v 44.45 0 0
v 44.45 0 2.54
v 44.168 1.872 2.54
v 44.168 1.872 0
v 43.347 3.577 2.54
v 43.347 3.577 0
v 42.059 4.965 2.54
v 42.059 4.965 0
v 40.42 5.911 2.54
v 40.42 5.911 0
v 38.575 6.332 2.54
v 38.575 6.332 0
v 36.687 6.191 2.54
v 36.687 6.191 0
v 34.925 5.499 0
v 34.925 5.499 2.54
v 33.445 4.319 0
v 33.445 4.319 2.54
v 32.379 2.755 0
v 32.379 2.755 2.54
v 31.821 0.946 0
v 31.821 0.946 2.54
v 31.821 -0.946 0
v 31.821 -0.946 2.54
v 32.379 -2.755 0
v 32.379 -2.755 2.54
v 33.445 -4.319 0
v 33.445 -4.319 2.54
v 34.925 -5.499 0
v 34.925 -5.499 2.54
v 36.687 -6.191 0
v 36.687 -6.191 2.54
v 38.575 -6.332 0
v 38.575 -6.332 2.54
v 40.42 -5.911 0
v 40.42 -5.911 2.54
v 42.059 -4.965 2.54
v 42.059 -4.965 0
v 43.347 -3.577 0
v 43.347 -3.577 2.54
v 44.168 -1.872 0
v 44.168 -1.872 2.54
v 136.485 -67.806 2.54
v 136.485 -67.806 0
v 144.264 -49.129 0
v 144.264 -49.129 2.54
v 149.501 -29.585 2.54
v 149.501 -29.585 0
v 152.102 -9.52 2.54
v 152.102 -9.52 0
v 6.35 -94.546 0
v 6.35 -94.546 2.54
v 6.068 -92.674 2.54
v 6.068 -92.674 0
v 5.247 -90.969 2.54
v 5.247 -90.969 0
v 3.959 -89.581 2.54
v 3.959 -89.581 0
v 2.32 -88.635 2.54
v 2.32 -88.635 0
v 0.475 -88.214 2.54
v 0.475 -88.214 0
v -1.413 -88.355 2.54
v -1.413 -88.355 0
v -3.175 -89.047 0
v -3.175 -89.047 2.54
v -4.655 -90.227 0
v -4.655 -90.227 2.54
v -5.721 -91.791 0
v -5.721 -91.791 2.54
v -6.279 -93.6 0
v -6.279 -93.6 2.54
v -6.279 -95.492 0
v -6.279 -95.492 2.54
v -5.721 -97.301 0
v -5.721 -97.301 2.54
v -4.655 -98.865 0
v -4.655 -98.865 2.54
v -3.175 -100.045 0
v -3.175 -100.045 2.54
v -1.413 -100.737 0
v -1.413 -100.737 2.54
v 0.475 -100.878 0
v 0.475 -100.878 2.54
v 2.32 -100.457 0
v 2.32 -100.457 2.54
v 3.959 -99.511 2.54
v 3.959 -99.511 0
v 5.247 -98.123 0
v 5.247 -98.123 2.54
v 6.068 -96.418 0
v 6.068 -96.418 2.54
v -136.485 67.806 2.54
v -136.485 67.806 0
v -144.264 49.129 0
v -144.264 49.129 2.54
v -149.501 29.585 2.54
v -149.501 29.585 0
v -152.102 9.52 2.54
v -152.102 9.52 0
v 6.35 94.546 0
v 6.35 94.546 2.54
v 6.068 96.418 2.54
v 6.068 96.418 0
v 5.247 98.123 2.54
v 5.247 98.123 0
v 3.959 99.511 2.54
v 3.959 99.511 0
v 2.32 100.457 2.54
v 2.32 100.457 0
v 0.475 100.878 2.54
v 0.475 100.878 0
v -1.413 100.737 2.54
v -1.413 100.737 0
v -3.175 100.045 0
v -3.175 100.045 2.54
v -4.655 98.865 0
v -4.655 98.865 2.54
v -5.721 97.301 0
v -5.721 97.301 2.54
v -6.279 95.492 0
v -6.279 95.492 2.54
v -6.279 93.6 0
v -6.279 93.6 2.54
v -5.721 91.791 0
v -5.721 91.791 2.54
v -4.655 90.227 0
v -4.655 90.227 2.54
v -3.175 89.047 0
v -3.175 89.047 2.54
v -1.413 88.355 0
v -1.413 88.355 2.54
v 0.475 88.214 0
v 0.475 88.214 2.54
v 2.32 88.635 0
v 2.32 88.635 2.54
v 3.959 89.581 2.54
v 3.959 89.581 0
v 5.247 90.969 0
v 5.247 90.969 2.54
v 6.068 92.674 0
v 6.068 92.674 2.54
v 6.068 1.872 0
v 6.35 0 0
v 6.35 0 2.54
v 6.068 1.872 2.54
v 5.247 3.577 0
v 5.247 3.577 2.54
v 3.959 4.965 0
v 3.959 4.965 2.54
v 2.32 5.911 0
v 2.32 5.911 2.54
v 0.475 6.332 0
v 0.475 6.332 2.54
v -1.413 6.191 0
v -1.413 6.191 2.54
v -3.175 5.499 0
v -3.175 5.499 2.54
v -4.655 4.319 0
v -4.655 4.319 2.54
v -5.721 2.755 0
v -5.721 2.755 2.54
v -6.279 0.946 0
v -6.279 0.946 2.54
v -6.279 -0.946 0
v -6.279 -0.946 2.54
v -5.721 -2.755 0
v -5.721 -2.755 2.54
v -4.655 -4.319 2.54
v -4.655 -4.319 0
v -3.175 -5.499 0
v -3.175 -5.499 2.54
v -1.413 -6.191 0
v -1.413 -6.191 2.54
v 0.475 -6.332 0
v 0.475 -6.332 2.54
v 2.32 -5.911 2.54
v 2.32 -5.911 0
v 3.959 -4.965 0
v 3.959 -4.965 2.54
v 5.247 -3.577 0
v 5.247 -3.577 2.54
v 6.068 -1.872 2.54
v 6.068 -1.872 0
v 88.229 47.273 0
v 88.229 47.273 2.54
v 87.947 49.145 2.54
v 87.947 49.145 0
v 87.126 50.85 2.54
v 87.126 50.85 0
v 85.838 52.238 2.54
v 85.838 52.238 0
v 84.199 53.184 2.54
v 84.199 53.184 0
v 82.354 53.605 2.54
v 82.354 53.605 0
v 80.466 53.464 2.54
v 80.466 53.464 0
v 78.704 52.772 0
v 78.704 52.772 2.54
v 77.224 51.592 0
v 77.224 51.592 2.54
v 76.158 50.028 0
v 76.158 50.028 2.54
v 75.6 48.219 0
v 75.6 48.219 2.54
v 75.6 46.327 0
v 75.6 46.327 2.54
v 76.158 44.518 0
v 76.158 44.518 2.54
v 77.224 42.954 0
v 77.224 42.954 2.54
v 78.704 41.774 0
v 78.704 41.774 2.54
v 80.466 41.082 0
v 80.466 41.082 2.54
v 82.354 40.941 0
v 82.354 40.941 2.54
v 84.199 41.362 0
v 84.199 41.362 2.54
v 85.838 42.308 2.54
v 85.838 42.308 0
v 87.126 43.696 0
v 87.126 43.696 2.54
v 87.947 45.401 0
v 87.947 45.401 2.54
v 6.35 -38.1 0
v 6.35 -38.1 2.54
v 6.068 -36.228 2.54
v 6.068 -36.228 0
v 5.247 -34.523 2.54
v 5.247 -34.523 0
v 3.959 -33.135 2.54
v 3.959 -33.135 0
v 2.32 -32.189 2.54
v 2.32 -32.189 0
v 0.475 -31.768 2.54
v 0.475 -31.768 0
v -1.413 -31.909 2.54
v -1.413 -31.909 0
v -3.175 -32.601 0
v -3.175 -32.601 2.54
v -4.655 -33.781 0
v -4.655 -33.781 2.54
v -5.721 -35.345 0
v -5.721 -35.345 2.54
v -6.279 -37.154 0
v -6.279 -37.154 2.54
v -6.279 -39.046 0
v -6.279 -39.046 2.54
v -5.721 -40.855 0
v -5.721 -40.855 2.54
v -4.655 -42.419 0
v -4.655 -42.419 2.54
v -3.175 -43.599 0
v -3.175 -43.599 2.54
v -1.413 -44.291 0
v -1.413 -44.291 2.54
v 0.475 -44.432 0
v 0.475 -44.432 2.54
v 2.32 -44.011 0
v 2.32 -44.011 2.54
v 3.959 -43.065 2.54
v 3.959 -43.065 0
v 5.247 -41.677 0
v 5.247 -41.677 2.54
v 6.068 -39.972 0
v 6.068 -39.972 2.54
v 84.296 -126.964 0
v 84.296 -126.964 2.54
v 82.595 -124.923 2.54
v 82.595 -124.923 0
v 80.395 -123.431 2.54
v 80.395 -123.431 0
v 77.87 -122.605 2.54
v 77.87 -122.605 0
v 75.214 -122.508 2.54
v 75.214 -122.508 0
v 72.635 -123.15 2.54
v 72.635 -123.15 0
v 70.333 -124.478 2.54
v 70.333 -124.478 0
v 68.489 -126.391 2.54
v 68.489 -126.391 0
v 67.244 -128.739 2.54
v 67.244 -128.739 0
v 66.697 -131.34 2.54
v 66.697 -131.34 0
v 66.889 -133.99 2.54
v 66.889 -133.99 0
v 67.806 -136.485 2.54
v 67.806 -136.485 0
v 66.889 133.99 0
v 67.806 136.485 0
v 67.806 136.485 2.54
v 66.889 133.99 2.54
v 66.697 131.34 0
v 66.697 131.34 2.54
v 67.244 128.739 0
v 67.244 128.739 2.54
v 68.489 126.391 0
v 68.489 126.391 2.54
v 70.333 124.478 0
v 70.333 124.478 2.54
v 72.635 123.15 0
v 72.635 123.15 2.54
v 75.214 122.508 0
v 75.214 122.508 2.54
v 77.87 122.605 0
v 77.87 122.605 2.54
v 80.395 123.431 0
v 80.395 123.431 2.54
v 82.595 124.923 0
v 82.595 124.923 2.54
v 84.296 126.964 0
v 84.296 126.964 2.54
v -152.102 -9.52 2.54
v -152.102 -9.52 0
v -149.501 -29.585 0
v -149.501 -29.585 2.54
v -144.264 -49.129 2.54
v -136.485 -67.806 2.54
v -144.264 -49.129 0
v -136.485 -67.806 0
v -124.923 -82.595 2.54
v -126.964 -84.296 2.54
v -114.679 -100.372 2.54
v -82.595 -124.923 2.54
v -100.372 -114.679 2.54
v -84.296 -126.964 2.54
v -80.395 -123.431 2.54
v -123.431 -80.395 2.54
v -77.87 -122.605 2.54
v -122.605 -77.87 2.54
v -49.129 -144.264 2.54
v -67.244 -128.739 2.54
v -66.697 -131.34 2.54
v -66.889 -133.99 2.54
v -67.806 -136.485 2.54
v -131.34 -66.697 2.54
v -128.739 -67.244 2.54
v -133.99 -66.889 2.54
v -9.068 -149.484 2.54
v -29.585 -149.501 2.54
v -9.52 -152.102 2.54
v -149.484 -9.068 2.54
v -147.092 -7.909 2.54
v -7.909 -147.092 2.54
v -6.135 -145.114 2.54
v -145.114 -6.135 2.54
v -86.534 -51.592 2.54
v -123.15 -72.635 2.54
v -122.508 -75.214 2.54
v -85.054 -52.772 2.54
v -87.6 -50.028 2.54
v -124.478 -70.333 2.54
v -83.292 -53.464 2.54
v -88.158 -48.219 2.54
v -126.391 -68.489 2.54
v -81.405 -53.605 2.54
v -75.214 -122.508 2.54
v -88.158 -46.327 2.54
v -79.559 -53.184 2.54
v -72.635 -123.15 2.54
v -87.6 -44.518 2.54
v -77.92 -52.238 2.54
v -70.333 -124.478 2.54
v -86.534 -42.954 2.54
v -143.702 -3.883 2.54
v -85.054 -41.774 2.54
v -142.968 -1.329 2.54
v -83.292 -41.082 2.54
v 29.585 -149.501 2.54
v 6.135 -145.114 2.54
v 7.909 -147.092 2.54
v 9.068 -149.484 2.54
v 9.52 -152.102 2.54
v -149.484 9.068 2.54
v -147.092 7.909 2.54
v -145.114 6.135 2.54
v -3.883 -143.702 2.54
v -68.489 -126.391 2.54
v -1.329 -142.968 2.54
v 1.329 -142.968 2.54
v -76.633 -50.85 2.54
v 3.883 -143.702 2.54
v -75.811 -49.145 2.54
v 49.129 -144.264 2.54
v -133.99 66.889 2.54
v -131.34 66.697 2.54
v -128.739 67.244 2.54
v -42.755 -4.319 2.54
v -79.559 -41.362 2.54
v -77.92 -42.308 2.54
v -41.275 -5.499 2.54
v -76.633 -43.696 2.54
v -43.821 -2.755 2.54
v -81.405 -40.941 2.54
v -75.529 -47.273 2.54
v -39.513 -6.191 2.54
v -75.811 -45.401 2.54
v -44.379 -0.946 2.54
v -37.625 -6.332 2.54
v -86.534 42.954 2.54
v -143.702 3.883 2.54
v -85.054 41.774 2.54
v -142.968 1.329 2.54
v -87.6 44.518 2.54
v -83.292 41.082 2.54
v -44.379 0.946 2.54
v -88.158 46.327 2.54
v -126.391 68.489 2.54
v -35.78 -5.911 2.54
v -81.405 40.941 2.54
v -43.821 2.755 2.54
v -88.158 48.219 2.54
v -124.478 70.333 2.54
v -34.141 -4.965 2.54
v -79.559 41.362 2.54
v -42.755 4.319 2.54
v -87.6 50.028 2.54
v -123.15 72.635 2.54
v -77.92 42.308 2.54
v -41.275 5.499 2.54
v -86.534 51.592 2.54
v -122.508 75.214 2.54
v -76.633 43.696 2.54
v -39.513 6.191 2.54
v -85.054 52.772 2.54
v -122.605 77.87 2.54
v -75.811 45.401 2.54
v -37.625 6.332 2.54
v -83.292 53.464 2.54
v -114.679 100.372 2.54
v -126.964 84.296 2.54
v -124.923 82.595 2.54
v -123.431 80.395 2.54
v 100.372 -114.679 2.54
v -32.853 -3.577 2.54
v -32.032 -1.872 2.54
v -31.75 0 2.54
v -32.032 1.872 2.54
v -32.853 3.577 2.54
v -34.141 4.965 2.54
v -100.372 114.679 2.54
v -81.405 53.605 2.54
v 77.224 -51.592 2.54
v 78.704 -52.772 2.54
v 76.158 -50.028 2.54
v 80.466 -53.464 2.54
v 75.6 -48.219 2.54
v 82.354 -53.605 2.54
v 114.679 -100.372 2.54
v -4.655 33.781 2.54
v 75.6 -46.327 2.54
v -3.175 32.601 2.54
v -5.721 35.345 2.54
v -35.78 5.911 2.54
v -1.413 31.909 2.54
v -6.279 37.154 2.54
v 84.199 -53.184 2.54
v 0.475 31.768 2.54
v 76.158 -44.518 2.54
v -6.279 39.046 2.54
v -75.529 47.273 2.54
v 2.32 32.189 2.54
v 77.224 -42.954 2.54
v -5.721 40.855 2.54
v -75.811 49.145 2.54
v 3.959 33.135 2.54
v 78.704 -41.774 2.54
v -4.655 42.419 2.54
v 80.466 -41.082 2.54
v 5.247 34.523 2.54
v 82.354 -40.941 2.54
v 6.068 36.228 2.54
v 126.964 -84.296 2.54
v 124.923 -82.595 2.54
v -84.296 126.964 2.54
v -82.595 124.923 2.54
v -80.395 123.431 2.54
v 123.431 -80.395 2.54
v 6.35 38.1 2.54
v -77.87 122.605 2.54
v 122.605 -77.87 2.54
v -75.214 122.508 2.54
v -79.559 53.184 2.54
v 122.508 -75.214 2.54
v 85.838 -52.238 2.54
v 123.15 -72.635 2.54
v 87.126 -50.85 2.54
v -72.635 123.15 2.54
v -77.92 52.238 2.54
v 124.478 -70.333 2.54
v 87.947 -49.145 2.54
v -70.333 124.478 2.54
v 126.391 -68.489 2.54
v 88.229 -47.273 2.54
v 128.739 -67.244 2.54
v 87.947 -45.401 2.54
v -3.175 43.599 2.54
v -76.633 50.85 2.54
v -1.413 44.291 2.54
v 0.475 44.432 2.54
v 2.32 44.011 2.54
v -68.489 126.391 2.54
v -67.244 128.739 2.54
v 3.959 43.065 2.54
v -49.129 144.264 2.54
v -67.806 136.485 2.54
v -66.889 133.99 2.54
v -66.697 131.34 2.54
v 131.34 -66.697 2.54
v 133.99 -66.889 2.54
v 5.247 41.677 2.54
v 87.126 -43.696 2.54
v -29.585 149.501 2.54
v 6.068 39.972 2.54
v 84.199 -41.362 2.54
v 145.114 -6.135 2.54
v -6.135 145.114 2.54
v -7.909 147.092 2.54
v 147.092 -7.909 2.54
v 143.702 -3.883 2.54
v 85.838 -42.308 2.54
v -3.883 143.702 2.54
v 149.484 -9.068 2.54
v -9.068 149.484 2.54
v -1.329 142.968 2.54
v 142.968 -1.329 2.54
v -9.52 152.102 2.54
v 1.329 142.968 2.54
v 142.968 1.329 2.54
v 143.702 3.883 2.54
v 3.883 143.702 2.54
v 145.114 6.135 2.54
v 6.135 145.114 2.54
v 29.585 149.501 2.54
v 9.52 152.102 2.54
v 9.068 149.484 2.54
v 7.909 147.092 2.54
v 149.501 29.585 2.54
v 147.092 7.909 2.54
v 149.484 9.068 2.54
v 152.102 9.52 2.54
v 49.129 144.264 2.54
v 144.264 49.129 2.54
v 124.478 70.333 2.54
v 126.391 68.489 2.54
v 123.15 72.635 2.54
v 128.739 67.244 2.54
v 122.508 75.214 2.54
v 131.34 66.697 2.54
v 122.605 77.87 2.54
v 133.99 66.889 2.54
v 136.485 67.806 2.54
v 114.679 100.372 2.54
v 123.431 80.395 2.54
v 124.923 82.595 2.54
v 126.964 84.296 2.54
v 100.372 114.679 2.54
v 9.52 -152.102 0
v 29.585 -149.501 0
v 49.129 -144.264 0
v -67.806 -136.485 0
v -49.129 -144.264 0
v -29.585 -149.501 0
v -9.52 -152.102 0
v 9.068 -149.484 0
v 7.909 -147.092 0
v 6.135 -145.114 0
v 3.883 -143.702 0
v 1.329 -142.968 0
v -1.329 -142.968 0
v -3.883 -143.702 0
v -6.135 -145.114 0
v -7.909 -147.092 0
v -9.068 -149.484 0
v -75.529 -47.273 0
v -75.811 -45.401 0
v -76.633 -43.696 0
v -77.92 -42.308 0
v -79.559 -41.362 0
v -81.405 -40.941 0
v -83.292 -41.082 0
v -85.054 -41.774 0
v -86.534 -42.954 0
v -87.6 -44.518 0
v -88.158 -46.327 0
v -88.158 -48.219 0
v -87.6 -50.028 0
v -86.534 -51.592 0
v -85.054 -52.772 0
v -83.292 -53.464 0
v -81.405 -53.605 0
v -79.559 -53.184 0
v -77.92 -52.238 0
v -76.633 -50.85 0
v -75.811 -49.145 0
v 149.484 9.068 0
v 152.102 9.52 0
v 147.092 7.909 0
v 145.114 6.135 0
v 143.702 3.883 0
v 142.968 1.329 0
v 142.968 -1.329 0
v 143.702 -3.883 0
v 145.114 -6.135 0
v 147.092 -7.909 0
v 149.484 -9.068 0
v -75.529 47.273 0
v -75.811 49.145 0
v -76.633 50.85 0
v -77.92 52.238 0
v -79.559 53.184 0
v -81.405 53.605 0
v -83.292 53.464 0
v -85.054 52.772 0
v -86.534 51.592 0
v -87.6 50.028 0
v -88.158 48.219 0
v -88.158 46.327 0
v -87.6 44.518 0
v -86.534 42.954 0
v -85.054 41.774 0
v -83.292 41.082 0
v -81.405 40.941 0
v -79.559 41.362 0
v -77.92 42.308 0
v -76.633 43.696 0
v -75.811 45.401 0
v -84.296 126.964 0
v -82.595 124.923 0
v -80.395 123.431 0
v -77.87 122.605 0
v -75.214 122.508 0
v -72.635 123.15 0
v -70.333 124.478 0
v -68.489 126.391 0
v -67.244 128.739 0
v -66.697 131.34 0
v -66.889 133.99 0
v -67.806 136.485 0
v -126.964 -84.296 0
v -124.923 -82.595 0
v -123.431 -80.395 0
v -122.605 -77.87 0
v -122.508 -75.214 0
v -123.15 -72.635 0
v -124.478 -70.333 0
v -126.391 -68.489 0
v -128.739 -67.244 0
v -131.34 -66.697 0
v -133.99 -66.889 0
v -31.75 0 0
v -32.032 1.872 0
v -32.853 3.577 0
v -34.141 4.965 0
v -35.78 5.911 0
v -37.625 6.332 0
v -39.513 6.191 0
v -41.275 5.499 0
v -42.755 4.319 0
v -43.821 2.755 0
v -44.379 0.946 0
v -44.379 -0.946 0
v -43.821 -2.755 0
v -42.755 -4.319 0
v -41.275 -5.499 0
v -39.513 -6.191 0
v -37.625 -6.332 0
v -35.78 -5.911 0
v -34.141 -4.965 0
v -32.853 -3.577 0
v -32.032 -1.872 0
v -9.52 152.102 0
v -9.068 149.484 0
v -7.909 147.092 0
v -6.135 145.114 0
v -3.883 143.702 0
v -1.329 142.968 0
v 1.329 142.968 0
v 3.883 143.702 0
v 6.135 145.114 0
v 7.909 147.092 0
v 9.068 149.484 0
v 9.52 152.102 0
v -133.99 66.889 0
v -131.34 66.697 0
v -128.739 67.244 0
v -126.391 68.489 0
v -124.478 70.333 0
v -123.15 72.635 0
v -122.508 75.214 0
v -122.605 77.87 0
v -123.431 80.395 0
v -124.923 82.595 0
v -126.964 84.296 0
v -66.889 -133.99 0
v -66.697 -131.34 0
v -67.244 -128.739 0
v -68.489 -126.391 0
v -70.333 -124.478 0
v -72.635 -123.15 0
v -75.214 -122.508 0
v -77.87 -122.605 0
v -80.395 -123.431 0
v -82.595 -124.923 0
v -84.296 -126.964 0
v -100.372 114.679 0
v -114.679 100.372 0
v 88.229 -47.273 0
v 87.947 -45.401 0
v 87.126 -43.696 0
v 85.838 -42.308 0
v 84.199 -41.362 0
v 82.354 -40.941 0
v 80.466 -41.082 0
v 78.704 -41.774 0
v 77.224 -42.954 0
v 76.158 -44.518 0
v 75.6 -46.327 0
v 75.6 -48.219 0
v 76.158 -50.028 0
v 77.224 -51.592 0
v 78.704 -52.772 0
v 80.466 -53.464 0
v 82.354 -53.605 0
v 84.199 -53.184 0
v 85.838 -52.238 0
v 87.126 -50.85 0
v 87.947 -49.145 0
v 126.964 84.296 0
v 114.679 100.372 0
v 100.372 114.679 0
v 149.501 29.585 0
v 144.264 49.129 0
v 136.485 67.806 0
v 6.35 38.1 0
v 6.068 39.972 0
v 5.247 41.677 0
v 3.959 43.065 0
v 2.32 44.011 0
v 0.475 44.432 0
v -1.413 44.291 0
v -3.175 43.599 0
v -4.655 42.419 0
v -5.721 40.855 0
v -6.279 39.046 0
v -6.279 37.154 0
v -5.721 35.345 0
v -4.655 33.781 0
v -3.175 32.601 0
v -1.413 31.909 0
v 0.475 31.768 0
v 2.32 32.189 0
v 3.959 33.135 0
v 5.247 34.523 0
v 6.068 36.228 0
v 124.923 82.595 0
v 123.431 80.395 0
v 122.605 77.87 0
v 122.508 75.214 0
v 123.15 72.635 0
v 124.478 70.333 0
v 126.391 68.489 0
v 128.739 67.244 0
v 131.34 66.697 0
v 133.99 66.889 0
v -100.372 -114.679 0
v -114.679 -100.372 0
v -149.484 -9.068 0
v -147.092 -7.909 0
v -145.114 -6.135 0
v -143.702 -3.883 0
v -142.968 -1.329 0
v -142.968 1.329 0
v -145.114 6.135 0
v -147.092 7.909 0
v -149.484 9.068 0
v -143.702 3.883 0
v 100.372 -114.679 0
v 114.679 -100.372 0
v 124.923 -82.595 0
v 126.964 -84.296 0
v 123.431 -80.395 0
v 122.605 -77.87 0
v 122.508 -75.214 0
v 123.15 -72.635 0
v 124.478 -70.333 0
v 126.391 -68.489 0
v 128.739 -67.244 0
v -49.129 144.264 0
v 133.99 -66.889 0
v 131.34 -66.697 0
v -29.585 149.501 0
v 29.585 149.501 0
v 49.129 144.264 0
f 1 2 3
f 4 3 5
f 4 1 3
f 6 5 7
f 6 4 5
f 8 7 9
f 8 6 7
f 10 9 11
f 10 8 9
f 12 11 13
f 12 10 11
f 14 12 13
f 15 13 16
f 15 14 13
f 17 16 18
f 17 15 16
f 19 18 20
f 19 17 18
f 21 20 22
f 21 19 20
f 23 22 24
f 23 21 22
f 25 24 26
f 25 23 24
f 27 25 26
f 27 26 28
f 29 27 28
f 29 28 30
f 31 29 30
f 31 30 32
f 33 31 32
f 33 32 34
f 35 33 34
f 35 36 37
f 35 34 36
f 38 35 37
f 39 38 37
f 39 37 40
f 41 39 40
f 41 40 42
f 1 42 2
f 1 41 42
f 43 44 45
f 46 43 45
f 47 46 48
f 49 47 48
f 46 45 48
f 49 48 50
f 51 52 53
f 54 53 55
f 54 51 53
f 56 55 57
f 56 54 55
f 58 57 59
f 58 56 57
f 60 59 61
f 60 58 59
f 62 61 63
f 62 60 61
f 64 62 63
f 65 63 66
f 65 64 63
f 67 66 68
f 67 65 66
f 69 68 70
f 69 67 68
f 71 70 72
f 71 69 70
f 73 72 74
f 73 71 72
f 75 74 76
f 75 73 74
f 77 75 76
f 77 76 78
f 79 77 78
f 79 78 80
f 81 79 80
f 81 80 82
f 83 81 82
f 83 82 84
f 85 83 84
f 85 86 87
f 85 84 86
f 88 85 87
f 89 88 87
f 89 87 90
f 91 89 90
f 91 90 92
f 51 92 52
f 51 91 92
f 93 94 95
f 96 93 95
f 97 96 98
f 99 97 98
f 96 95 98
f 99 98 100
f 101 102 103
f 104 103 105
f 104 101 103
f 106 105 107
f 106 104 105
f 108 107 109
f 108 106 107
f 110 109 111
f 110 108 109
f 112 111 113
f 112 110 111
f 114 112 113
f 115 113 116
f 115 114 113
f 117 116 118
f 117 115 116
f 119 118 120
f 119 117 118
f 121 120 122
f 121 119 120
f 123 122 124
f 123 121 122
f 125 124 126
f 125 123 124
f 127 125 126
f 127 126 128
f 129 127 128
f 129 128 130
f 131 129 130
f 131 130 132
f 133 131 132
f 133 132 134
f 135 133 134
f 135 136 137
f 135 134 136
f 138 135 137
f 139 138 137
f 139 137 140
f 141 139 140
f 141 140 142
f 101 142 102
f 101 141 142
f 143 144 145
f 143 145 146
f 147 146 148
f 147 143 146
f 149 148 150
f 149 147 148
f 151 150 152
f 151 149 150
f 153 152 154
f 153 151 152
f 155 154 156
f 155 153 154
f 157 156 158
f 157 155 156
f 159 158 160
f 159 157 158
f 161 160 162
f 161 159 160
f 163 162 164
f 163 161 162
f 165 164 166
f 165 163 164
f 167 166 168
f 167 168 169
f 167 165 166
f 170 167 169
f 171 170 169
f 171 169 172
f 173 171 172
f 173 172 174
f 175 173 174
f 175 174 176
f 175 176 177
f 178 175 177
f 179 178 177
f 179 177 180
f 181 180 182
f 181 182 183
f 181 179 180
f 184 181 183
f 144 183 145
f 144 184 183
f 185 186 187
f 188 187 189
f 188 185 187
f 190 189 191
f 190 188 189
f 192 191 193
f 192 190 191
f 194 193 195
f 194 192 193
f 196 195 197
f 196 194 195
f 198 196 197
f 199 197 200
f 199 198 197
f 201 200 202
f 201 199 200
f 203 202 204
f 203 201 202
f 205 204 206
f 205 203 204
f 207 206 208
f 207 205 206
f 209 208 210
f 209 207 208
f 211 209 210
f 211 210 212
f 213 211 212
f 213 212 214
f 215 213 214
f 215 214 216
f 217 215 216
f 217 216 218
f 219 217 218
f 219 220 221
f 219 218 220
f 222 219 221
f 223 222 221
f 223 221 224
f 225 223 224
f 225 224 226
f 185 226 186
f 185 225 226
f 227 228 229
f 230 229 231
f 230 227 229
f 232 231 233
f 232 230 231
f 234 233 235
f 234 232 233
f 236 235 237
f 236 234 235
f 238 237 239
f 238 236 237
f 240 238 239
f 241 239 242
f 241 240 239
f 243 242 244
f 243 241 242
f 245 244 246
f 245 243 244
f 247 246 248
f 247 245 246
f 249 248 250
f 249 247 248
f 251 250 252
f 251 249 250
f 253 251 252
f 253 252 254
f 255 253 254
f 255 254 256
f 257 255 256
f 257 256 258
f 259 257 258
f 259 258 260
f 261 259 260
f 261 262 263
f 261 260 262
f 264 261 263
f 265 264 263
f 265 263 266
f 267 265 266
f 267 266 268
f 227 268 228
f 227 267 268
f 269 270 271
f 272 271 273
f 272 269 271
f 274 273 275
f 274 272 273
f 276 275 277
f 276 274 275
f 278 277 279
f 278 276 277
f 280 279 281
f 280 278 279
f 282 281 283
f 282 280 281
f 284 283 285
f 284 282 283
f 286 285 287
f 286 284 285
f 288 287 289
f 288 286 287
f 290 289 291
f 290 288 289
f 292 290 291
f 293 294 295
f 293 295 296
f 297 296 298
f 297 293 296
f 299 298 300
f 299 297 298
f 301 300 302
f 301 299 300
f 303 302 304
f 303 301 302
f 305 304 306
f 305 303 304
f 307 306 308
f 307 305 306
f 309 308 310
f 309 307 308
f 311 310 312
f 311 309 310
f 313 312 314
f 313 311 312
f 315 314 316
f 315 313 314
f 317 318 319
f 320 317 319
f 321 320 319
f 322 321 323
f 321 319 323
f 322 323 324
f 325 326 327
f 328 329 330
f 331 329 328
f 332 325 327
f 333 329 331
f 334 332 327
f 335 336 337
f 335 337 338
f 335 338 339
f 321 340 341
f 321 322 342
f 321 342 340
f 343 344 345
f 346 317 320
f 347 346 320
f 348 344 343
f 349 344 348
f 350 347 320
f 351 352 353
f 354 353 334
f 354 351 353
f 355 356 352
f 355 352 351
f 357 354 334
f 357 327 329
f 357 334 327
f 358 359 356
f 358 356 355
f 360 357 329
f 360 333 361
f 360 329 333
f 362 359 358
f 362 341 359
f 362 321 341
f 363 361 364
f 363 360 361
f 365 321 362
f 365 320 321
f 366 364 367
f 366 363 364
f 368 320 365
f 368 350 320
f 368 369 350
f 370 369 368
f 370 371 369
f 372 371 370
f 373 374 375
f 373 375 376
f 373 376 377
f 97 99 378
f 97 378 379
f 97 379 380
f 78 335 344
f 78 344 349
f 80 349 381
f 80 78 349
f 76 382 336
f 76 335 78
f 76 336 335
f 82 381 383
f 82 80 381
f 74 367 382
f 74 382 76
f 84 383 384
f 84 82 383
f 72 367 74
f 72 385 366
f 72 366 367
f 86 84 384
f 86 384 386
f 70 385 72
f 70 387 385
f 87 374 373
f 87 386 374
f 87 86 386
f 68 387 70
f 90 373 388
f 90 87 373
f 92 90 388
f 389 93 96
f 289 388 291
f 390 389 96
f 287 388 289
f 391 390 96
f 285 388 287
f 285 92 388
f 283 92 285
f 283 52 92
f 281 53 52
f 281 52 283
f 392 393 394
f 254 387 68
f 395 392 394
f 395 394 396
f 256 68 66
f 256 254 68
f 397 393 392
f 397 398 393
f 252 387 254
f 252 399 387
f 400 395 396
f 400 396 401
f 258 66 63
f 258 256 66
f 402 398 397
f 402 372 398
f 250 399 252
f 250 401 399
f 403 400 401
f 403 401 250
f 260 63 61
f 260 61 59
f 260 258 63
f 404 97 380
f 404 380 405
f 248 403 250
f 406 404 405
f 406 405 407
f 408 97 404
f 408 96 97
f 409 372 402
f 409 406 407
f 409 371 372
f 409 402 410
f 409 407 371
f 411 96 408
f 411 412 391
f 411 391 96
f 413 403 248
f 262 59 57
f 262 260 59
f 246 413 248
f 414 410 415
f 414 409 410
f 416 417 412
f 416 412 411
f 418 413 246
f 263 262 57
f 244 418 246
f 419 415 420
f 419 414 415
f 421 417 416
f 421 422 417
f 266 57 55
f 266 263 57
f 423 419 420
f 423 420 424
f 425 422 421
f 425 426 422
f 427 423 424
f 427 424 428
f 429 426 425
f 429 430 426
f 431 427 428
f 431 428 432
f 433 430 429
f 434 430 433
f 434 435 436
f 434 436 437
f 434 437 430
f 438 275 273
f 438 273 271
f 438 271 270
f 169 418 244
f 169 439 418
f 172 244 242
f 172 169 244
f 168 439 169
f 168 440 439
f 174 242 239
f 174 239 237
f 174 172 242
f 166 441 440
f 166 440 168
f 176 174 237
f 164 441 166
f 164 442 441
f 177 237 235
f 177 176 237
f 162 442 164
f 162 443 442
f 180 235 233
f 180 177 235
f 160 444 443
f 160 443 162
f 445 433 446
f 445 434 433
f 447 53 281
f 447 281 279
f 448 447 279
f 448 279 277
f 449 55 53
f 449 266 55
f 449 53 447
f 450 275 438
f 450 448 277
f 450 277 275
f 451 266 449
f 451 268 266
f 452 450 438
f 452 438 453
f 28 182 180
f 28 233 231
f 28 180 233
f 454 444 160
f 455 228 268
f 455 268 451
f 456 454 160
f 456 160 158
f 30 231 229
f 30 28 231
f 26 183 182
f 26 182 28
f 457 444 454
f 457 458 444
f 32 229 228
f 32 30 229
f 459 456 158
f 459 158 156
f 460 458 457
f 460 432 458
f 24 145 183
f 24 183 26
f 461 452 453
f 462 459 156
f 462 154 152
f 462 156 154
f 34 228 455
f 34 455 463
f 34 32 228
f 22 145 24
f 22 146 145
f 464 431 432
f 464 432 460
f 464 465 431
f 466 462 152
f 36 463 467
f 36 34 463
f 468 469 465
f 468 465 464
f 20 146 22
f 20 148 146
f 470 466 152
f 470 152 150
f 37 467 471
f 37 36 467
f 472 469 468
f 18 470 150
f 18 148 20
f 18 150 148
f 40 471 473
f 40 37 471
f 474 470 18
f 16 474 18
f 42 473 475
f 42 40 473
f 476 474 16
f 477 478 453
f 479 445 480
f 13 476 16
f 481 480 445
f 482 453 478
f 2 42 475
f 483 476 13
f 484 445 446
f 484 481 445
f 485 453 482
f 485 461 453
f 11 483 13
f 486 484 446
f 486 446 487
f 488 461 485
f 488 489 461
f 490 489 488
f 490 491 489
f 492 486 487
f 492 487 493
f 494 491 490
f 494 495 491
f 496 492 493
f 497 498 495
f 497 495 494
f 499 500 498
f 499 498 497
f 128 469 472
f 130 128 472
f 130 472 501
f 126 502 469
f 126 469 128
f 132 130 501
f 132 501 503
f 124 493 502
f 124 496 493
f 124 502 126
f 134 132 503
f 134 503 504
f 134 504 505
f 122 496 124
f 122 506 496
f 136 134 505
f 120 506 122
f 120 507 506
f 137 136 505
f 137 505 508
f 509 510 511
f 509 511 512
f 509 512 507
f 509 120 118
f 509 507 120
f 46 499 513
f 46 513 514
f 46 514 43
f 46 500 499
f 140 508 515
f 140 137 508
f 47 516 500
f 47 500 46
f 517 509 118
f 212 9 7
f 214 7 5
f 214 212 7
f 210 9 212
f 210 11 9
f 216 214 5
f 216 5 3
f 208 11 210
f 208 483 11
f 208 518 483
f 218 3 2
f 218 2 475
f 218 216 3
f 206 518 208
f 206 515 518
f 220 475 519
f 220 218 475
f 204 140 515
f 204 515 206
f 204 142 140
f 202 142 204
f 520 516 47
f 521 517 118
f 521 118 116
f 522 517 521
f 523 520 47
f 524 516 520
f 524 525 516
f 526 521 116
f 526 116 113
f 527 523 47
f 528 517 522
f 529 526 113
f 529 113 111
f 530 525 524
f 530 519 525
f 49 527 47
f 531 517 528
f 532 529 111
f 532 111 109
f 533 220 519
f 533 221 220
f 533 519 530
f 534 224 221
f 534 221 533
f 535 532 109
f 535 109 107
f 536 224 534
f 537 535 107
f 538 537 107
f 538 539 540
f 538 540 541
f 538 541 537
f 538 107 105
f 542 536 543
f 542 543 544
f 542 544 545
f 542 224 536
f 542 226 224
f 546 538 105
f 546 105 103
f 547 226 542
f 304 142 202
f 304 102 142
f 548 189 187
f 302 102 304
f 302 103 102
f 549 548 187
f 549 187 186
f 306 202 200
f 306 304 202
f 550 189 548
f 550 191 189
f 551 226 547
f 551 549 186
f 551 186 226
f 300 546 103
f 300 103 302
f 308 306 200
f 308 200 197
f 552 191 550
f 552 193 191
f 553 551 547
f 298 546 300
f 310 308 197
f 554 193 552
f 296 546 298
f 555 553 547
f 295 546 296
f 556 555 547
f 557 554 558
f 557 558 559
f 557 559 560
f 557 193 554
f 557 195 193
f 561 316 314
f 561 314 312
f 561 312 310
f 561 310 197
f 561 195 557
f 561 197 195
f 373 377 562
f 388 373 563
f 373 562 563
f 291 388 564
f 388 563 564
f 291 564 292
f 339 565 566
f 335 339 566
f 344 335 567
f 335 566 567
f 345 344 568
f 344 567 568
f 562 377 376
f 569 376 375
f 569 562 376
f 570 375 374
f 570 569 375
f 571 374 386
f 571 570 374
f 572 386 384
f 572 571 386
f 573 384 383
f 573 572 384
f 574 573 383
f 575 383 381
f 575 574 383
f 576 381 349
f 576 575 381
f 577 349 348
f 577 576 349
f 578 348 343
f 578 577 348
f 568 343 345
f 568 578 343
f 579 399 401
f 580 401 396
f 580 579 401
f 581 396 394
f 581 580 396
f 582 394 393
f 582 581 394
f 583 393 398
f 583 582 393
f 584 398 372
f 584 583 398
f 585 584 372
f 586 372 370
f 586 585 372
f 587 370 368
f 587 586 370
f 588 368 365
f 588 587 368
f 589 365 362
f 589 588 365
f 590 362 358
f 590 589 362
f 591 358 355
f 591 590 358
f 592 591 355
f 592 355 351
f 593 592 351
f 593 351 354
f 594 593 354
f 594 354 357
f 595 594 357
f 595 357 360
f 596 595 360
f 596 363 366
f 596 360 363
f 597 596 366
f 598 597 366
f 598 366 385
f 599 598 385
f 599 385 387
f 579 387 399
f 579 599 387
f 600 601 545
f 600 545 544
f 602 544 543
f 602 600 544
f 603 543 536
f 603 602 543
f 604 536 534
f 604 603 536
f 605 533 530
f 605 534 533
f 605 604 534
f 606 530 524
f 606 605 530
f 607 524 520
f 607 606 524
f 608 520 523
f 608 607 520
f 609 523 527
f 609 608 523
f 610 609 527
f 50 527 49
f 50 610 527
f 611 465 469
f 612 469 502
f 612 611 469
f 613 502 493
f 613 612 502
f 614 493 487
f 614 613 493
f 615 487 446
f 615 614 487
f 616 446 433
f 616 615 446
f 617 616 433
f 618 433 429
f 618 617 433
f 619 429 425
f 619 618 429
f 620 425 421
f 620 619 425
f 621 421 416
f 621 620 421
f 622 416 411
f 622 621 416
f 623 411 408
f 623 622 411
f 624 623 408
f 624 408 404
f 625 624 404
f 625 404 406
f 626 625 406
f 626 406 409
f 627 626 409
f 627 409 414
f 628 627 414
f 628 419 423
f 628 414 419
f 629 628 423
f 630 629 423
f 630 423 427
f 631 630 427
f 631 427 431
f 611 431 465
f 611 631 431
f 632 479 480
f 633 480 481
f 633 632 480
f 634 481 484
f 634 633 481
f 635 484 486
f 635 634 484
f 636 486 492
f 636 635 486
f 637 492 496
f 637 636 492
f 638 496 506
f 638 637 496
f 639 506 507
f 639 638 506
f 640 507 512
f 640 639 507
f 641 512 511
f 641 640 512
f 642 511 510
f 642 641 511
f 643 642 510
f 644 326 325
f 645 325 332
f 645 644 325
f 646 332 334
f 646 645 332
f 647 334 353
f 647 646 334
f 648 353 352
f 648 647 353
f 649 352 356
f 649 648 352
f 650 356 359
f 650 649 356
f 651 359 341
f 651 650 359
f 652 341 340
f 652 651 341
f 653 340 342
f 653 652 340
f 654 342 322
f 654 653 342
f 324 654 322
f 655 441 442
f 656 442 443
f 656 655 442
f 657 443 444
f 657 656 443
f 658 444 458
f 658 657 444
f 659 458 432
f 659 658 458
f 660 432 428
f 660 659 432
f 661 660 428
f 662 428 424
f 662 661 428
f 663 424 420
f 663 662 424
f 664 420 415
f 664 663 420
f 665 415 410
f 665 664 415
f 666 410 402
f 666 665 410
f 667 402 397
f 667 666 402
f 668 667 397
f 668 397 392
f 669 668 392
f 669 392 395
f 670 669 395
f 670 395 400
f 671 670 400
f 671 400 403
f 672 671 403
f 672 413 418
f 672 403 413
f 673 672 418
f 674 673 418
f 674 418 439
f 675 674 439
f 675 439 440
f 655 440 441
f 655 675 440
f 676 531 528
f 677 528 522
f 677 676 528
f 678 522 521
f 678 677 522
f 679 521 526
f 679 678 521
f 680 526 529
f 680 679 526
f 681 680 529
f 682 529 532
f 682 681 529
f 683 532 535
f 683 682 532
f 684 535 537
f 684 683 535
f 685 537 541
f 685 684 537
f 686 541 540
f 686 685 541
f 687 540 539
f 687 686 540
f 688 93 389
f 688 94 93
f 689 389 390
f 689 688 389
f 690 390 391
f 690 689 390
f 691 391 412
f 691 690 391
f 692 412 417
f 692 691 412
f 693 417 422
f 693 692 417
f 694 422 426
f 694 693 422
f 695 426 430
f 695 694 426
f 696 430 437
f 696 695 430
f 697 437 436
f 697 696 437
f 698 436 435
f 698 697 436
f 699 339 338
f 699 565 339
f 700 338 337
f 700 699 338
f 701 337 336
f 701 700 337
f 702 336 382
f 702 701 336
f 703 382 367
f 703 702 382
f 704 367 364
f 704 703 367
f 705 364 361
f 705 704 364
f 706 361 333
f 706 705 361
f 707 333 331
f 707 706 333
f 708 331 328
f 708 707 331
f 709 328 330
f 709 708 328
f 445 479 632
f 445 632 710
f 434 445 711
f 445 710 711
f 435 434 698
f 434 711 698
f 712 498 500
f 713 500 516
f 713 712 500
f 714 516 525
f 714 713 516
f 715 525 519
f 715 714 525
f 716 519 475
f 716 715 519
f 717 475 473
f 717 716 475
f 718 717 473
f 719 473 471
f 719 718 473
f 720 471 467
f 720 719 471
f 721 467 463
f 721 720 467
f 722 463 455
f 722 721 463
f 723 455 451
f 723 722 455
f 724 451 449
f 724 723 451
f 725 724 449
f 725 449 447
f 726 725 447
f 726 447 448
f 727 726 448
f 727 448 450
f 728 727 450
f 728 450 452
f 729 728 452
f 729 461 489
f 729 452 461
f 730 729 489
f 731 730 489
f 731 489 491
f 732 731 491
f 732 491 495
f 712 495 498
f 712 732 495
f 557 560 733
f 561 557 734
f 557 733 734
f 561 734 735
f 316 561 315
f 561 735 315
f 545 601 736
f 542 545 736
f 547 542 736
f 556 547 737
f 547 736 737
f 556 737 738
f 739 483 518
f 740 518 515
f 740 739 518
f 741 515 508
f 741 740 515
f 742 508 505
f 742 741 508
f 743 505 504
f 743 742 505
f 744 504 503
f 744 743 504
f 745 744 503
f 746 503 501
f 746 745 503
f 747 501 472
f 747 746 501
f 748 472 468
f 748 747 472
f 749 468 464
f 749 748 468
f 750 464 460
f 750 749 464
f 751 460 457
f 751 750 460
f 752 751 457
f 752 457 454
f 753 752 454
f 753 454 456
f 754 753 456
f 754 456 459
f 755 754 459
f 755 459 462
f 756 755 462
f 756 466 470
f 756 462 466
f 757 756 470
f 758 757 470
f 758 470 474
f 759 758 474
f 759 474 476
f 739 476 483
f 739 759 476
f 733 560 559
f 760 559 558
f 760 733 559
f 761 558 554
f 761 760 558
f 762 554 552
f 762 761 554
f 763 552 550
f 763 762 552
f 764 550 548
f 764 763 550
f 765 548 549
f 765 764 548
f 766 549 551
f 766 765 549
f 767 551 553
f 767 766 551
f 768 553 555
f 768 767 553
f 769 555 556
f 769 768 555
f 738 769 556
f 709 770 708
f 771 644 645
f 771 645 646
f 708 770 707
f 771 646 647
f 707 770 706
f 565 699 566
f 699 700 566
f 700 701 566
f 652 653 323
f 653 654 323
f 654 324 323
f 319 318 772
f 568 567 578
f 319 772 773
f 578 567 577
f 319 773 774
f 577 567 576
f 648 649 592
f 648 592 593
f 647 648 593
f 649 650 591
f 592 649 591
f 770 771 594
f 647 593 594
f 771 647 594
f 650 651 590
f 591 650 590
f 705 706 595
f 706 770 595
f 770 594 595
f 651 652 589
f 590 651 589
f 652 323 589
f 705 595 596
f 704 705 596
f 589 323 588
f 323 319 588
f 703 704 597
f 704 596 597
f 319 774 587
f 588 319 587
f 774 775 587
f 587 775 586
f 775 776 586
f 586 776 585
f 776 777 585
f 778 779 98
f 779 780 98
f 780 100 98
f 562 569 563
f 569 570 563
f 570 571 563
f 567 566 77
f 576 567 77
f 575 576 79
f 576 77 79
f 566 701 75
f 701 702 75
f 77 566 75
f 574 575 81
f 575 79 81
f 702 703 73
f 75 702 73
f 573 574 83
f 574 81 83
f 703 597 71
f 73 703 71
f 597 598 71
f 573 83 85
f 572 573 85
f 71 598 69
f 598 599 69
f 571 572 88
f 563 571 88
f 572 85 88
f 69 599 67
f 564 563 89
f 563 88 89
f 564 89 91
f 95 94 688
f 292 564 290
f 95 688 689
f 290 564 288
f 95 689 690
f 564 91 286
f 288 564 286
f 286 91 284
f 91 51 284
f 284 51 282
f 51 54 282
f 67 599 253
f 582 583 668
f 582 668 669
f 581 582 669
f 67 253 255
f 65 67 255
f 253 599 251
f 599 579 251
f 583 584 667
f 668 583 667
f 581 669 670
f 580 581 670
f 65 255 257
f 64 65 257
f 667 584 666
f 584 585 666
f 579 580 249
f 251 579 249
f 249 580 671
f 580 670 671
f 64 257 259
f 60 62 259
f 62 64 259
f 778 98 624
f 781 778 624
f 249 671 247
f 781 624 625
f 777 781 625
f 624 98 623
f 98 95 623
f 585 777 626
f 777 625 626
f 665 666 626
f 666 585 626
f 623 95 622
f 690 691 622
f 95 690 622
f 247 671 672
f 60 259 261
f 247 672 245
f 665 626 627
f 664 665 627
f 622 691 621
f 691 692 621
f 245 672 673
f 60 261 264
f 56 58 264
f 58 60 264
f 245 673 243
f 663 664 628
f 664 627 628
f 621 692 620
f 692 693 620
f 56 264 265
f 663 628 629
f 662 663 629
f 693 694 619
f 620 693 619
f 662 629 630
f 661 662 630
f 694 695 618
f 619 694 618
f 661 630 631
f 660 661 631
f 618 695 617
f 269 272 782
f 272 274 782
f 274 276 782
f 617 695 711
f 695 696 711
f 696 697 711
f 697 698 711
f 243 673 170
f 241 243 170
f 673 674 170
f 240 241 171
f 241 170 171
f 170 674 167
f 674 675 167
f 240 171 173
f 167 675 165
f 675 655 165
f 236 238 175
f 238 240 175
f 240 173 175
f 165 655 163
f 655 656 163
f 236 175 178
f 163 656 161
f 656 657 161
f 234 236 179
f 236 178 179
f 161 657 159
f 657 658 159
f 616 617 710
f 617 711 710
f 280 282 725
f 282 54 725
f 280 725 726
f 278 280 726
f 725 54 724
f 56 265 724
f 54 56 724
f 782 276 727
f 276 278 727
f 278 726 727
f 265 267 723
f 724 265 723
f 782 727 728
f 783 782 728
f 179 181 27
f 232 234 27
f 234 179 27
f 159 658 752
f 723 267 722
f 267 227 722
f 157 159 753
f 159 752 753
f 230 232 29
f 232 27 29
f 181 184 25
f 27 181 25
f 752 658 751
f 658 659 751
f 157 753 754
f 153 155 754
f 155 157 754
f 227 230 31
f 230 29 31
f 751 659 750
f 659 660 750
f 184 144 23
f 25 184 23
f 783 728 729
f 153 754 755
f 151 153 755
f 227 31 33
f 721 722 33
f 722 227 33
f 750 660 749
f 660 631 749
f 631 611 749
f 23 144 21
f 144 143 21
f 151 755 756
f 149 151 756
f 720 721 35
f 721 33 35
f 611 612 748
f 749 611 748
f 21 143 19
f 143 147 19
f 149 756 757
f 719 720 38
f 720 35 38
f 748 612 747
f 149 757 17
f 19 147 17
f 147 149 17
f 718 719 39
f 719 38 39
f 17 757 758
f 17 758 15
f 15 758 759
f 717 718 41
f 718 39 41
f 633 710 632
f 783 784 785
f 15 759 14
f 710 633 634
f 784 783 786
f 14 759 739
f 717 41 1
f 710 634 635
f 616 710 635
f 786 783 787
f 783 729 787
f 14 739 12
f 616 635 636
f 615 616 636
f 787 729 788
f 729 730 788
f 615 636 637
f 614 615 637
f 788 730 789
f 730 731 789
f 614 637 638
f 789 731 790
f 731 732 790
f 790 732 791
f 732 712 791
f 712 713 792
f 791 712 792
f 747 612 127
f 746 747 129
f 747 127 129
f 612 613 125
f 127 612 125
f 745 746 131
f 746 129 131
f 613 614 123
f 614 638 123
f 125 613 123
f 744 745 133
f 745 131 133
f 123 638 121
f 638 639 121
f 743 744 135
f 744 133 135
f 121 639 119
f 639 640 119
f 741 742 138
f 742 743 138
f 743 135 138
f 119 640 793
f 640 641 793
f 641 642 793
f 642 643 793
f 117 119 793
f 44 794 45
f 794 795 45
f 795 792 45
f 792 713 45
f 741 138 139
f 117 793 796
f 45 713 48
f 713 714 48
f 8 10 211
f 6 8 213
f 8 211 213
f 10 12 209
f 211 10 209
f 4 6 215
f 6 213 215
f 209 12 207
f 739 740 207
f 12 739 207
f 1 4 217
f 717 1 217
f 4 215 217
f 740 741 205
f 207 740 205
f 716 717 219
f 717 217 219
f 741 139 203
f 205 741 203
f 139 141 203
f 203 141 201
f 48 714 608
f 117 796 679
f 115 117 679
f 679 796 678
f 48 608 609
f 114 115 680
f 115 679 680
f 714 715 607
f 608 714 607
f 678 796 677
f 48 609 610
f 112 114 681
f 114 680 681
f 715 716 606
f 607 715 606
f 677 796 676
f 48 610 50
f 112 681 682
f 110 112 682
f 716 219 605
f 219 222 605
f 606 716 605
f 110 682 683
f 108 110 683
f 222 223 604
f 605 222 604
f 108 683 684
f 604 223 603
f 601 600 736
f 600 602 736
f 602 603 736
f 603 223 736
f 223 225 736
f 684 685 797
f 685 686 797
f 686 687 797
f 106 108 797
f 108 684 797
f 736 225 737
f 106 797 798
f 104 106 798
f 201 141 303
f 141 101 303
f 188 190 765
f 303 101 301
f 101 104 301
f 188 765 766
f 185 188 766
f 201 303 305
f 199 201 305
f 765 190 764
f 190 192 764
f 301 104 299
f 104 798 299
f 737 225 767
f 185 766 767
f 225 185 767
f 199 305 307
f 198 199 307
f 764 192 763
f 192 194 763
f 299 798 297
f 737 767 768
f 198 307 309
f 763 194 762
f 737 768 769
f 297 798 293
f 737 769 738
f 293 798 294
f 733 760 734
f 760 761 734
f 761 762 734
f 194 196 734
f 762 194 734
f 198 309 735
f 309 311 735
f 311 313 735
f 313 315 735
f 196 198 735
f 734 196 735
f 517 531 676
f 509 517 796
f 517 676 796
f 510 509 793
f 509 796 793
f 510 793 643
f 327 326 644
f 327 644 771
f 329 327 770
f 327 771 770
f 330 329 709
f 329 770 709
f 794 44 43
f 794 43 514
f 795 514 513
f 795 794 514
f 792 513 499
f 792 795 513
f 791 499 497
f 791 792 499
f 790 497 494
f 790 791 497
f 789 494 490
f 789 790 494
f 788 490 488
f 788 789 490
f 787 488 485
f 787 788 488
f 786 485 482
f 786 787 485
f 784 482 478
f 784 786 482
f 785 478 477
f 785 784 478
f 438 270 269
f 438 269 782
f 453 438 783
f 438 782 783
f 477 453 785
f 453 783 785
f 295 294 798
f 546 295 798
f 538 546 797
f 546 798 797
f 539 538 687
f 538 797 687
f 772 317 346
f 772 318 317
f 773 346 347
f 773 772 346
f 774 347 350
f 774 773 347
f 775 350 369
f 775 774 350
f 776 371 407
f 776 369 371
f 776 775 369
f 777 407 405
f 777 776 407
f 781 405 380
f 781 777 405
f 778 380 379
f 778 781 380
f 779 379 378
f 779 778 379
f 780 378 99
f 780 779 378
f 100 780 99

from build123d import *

# Parameters (mm, degrees)
SKETCH1_R           = 152.4
BOSS_EXTRUDE1_DEPTH = 2.54
SKETCH2_R           = 9.525
SKETCH2_R_2         = 6.35
CUT_EXTRUDE2_DEPTH  = 3.54
SKETCH4_R           = 6.35
CUT_EXTRUDE4_DEPTH  = 2.54


with BuildPart() as part:
    # Sketch1 → Boss-Extrude1 (new body)
    with BuildSketch(Plane.XY):
        Circle(SKETCH1_R)
    extrude(amount=BOSS_EXTRUDE1_DEPTH)

    # Sketch2 → Cut-Extrude2 (cut, through all)
    with BuildSketch(Plane.XY):
        with Locations((152.4, 0)):
            Circle(SKETCH2_R)
        with Locations((131.982271537, -76.2)):
            Circle(SKETCH2_R)
        with Locations((76.2, -131.982271537)):
            Circle(SKETCH2_R)
        with Locations((0, -152.4)):
            Circle(SKETCH2_R)
        with Locations((-76.2, -131.982271537)):
            Circle(SKETCH2_R)
        with Locations((-131.982271537, -76.2)):
            Circle(SKETCH2_R)
        with Locations((-152.4, 0)):
            Circle(SKETCH2_R)
        with Locations((-131.982271537, 76.2)):
            Circle(SKETCH2_R)
        with Locations((-76.2, 131.982271537)):
            Circle(SKETCH2_R)
        with Locations((0, 152.4)):
            Circle(SKETCH2_R)
        with Locations((76.2, 131.982271537)):
            Circle(SKETCH2_R)
        with Locations((131.982271537, 76.2)):
            Circle(SKETCH2_R)
        with Locations((38.1, 0)):
            Circle(SKETCH2_R_2)
        with Locations((0, -38.1)):
            Circle(SKETCH2_R_2)
        with Locations((-38.1, 0)):
            Circle(SKETCH2_R_2)
        with Locations((0, 38.1)):
            Circle(SKETCH2_R_2)
        with Locations((81.879271907, -47.273019677)):
            Circle(SKETCH2_R_2)
        with Locations((0, -94.546039353)):
            Circle(SKETCH2_R_2)
        with Locations((-81.879271907, -47.273019677)):
            Circle(SKETCH2_R_2)
        with Locations((-81.879271907, 47.273019677)):
            Circle(SKETCH2_R_2)
        with Locations((0, 94.546039353)):
            Circle(SKETCH2_R_2)
        with Locations((81.879271907, 47.273019677)):
            Circle(SKETCH2_R_2)
    extrude(amount=CUT_EXTRUDE2_DEPTH, mode=Mode.SUBTRACT)

    # Sketch4 → Cut-Extrude4 (cut)
    with BuildSketch(Plane.XY):
        Circle(SKETCH4_R)
    extrude(amount=CUT_EXTRUDE4_DEPTH, mode=Mode.SUBTRACT)


solid = part.part
